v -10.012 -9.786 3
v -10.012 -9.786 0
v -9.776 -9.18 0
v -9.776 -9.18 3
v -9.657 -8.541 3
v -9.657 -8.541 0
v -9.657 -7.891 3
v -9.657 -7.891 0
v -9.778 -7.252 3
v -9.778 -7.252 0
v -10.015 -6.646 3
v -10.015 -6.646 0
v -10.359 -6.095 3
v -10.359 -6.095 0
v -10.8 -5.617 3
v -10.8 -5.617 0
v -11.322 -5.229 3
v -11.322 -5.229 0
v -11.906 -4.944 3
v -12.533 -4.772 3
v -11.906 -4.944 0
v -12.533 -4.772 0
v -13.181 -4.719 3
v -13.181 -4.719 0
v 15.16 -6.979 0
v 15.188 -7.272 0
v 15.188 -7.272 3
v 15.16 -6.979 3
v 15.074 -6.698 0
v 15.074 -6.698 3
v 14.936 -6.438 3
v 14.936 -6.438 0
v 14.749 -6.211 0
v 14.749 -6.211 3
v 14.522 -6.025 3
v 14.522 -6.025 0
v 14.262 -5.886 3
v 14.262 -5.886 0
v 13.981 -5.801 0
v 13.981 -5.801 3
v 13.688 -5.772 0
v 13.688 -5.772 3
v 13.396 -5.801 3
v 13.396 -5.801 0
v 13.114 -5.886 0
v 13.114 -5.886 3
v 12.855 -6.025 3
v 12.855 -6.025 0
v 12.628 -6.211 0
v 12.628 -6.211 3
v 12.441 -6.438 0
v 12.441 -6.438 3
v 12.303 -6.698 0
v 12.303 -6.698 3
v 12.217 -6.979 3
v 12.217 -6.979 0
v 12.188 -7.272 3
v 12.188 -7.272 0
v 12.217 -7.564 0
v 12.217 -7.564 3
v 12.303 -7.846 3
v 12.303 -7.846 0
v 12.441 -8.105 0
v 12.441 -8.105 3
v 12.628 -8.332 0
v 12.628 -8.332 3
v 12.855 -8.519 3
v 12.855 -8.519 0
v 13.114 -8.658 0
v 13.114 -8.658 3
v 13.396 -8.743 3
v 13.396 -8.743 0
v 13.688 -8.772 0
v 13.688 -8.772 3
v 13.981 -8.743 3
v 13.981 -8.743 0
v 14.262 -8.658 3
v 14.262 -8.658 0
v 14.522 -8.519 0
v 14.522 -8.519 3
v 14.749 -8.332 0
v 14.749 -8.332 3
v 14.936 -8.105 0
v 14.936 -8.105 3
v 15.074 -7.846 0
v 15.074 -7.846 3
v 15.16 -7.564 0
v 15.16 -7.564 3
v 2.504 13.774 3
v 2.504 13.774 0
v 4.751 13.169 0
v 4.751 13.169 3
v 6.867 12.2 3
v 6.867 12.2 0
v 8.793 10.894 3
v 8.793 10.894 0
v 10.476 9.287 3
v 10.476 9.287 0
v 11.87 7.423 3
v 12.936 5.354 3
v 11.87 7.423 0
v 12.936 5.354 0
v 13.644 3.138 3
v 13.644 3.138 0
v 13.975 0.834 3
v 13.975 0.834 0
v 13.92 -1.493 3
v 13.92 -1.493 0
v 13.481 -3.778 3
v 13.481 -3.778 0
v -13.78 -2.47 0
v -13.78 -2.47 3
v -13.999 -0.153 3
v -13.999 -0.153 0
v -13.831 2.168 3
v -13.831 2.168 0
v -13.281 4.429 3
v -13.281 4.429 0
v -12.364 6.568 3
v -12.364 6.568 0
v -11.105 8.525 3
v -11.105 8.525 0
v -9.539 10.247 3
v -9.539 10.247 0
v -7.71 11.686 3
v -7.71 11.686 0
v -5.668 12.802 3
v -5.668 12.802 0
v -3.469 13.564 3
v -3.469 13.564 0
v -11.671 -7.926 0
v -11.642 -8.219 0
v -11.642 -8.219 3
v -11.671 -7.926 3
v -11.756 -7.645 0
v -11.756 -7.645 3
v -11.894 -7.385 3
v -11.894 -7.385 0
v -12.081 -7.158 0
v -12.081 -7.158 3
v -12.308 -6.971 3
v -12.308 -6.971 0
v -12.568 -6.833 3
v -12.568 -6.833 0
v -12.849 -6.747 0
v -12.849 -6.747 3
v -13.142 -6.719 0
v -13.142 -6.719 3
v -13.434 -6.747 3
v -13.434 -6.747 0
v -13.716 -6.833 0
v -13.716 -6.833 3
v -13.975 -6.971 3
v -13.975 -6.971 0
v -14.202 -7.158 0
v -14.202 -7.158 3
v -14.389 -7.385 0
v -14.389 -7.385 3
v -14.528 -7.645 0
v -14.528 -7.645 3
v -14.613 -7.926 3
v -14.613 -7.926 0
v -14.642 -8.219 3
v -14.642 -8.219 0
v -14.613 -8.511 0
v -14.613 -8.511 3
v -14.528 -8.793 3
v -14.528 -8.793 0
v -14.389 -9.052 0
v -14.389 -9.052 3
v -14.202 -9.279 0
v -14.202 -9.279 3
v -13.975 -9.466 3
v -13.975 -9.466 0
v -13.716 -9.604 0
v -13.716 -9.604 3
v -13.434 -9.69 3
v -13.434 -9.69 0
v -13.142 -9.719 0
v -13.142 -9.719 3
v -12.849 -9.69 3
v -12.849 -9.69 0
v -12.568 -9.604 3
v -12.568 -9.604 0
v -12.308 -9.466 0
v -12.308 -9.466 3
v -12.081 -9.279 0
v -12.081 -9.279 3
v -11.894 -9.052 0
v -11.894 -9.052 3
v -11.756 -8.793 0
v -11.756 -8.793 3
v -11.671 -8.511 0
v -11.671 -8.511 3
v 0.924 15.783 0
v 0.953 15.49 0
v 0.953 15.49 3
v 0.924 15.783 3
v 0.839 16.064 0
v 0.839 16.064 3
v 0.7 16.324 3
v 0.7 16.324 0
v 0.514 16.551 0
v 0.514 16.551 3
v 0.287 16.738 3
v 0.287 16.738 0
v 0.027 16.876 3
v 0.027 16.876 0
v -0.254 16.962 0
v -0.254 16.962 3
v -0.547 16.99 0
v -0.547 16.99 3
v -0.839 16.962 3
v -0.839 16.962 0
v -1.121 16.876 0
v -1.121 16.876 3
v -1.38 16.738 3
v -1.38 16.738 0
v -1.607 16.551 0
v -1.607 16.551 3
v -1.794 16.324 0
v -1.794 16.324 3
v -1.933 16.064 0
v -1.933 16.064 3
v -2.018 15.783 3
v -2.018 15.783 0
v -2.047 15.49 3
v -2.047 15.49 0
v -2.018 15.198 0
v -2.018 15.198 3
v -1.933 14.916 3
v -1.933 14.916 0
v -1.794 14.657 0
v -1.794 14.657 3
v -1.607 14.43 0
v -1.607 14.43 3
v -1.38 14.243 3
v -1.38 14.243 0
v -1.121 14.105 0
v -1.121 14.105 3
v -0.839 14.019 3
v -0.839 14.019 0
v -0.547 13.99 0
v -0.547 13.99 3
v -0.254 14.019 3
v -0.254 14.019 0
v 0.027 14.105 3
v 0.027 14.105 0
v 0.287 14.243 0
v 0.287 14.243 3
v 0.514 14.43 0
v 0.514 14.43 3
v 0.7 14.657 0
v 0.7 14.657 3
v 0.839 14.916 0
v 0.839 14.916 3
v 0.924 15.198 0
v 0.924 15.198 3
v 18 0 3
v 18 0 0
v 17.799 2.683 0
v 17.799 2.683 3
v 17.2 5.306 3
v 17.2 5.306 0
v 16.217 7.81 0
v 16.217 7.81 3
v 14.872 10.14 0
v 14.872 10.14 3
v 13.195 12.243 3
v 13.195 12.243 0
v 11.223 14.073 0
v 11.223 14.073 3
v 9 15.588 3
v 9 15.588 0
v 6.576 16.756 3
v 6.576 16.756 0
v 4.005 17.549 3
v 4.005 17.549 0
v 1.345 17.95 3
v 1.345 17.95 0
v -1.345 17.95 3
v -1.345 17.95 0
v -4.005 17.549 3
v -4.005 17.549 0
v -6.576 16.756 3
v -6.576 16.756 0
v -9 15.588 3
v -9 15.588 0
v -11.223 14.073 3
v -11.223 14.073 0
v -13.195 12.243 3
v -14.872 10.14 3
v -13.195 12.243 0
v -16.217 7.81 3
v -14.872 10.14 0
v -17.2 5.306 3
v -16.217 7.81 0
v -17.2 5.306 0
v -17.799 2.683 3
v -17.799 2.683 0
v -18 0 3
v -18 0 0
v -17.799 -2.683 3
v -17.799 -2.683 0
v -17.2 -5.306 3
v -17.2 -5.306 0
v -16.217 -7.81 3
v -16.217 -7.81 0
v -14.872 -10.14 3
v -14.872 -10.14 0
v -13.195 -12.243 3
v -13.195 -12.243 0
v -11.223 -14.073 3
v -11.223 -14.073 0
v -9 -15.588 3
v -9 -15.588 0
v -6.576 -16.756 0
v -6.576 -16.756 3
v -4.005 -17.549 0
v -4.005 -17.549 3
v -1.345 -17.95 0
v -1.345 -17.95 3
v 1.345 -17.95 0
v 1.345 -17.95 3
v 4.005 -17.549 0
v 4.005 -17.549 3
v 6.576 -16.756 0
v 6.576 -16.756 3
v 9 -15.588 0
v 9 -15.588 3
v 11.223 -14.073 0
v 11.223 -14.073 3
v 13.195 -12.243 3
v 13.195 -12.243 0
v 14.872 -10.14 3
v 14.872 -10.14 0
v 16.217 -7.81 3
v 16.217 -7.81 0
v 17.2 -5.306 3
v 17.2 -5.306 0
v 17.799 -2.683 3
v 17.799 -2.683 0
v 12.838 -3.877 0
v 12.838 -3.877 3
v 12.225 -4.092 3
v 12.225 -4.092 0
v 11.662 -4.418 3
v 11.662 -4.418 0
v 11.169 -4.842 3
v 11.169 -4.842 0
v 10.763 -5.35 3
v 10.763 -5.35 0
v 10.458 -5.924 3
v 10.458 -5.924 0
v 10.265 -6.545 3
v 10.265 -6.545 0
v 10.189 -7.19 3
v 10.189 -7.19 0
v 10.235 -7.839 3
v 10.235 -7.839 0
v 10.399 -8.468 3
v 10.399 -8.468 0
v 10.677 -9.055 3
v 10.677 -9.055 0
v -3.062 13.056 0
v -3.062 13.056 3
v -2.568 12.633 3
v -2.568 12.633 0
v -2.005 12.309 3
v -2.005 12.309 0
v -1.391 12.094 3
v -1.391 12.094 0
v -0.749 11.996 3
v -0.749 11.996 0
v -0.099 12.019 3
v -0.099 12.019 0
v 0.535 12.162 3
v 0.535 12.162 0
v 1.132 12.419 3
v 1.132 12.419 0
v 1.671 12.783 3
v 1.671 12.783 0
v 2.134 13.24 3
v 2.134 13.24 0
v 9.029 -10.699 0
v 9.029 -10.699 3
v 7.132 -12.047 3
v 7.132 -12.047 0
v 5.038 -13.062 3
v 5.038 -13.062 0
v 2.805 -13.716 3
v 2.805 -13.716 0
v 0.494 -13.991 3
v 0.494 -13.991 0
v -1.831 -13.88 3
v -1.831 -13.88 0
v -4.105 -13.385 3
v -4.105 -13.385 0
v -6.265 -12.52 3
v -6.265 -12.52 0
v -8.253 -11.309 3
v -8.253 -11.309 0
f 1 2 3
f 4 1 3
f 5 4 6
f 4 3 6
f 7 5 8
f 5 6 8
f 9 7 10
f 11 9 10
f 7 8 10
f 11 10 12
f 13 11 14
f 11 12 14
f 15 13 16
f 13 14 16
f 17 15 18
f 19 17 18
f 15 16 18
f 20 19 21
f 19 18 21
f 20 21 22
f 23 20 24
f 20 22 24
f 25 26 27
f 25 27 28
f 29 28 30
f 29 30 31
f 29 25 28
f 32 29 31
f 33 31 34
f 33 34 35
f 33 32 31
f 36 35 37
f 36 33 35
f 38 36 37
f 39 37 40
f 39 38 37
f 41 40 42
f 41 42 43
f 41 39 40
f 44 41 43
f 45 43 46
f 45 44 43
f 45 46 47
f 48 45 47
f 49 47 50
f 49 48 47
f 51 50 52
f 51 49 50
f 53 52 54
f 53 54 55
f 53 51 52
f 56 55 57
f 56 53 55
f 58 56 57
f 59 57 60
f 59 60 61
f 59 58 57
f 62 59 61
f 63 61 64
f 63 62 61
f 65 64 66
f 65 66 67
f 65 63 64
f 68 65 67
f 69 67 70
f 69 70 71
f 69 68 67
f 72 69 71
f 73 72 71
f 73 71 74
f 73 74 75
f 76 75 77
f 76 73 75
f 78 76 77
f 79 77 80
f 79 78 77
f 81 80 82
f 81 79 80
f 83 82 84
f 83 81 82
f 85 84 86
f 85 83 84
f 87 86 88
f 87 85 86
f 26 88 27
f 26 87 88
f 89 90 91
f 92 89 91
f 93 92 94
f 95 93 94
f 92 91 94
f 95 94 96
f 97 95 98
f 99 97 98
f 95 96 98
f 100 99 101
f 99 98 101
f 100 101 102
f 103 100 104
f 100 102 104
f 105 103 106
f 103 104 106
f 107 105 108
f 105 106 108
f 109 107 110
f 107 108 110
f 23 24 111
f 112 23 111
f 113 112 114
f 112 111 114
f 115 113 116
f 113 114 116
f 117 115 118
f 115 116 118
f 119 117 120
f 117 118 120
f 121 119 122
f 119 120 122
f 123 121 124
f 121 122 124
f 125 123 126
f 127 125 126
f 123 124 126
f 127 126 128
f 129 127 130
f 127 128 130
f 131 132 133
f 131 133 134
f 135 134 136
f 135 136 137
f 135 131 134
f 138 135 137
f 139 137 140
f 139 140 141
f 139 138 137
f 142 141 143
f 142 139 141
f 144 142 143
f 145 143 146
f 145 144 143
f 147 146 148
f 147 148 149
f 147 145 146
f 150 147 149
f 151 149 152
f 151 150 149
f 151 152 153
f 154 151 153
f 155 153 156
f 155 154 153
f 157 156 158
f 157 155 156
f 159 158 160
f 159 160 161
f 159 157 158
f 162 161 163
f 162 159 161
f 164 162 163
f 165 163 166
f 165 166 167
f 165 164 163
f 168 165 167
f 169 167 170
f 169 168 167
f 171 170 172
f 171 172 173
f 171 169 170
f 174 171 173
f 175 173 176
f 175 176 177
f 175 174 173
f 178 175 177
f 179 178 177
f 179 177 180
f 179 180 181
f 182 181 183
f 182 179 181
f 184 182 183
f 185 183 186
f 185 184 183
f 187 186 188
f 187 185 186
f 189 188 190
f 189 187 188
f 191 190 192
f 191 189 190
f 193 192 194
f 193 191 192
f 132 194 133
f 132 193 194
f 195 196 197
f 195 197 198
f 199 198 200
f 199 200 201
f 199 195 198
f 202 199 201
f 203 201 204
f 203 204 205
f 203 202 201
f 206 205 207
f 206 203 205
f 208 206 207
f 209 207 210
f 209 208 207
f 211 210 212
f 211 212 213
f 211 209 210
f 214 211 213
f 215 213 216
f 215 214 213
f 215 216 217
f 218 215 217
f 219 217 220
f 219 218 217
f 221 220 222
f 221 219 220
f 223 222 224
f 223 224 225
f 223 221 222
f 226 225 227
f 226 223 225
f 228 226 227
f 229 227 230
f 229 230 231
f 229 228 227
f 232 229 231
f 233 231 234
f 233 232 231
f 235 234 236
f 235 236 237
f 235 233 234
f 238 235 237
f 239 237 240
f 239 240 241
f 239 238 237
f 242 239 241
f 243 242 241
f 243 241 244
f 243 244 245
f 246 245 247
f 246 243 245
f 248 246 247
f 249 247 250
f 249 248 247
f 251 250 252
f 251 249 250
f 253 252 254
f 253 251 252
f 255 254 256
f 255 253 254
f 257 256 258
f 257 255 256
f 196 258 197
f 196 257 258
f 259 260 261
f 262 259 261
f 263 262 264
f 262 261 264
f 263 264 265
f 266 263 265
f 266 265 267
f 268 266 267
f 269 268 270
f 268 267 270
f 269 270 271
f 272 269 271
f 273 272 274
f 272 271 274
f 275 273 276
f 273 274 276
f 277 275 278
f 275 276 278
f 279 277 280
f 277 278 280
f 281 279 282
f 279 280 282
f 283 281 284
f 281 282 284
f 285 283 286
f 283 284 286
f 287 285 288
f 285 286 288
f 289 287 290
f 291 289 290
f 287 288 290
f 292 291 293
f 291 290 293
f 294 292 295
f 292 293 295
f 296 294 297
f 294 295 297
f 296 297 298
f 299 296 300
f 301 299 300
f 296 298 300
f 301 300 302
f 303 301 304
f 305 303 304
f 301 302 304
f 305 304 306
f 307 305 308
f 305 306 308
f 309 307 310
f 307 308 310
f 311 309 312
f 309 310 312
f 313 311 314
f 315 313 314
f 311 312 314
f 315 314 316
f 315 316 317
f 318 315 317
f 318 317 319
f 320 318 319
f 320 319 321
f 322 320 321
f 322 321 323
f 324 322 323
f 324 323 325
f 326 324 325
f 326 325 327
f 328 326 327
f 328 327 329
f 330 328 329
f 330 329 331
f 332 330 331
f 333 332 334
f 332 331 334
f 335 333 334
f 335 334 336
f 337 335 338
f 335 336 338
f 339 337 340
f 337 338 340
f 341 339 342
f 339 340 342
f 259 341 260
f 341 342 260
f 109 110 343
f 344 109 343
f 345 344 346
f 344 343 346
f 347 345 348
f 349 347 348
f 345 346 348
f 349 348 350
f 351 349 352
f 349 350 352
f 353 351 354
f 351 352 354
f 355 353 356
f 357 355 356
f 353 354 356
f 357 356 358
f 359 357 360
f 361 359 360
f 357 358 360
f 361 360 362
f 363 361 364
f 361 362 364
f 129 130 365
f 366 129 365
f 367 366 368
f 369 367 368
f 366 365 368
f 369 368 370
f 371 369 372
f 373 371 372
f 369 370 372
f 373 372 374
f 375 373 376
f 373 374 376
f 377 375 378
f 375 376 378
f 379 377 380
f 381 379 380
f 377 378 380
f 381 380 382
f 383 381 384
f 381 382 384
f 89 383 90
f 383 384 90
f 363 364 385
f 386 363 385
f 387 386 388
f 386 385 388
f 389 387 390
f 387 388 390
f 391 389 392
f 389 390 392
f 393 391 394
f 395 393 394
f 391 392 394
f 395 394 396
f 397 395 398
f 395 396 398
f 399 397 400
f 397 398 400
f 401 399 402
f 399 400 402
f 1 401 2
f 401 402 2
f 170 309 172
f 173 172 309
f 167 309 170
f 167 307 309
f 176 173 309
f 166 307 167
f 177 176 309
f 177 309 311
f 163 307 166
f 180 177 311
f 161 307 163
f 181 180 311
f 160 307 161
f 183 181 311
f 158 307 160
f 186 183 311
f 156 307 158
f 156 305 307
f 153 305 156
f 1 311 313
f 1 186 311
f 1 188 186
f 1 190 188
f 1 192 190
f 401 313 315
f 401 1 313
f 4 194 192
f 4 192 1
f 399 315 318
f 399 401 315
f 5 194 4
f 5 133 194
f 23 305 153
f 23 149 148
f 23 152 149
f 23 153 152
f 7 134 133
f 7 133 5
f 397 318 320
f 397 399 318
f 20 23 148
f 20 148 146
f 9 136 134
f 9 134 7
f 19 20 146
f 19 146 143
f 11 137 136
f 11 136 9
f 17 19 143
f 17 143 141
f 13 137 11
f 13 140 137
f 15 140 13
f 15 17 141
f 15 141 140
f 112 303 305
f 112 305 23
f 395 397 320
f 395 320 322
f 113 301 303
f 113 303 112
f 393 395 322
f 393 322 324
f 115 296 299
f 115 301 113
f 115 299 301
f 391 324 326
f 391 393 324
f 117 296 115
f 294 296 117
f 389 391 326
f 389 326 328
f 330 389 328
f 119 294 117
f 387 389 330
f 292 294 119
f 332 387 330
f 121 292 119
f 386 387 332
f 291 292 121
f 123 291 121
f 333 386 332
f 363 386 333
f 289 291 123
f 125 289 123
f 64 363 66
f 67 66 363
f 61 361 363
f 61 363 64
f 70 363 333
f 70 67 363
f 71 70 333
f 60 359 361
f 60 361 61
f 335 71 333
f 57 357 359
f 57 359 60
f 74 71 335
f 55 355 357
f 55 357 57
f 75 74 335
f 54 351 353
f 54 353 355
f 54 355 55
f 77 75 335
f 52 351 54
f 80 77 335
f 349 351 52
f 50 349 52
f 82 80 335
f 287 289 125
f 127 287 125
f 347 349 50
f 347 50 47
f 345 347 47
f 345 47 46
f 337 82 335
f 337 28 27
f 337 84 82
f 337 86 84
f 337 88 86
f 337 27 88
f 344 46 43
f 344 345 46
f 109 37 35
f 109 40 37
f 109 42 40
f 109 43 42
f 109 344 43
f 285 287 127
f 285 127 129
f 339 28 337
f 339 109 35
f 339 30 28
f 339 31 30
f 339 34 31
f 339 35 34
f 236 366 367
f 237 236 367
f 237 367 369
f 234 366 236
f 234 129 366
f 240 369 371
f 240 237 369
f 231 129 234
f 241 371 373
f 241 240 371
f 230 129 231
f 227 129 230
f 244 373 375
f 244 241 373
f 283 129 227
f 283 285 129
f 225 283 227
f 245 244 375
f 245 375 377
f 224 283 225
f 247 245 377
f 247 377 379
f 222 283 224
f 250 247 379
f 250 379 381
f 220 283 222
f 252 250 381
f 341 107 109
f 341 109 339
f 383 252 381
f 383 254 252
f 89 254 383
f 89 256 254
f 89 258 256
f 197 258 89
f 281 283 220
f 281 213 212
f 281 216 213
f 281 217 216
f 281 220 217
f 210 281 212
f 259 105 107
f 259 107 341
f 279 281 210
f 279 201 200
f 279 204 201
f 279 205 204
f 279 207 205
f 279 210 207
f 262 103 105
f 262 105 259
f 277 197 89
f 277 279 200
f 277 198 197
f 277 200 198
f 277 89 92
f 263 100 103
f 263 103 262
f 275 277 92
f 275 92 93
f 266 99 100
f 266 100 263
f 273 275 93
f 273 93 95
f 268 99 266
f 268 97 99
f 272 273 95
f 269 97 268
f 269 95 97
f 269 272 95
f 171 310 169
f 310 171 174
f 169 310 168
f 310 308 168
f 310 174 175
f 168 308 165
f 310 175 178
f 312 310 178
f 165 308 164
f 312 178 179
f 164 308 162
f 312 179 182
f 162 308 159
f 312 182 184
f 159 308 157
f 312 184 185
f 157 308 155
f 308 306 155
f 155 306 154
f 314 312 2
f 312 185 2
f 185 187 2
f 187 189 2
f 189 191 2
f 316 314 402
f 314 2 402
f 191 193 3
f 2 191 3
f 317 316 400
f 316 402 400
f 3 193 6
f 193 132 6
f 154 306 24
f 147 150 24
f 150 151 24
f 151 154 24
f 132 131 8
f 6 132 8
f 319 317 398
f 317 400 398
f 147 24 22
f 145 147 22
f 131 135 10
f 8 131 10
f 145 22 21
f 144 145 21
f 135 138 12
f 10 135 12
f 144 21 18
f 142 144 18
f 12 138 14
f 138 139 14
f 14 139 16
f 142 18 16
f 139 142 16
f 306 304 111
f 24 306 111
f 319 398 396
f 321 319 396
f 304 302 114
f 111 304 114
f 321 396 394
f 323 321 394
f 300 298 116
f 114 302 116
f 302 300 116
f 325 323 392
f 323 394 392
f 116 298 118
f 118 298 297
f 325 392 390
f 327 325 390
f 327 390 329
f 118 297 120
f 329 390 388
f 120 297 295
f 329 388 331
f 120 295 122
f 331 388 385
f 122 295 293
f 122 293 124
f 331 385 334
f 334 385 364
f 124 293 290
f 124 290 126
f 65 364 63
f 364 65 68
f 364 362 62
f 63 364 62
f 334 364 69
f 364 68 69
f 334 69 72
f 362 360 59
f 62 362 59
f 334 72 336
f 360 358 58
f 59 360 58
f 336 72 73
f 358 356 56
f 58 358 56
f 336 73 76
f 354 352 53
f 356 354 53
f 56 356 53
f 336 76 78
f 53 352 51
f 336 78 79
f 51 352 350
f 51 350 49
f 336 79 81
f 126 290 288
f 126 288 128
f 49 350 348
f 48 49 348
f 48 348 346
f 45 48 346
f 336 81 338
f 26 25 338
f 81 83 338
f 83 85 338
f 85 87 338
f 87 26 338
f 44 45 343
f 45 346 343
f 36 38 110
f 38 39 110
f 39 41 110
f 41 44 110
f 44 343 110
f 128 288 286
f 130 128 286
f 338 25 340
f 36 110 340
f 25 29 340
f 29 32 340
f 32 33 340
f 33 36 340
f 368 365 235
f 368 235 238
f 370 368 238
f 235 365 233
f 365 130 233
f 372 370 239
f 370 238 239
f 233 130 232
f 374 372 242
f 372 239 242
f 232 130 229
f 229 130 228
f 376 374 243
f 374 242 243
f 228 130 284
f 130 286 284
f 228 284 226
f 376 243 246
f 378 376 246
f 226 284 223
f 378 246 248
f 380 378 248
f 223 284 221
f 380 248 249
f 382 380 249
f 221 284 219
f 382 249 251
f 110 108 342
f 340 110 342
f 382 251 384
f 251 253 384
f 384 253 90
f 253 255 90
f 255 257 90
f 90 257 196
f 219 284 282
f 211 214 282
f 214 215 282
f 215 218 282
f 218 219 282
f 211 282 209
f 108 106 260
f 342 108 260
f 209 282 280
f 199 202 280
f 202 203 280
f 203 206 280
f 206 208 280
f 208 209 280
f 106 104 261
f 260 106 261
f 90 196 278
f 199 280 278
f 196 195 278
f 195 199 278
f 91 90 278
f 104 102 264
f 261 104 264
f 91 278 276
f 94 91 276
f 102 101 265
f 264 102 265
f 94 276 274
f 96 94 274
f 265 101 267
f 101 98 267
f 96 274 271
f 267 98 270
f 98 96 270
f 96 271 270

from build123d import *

# Parameters (mm, degrees)
ESQUISSE1_R        = 18
ESQUISSE1_R_2      = 1.5
BOSS_EXTRU_2_DEPTH = 3


with BuildPart() as part:
    # Esquisse1 → Boss.-Extru.2 (new body)
    with BuildSketch(Plane.XY):
        Circle(ESQUISSE1_R)
        with Locations((-0.546712729, 15.490355231)):
            Circle(ESQUISSE1_R_2, mode=Mode.SUBTRACT)
        with Locations((-13.14168478, -8.218644727)):
            Circle(ESQUISSE1_R_2, mode=Mode.SUBTRACT)
        with Locations((13.688397508, -7.271710504)):
            Circle(ESQUISSE1_R_2, mode=Mode.SUBTRACT)
        with BuildLine():
            ThreePointArc((-3.468577117, 13.56351624), (-0.423261467, 11.992533082), (2.503723019, 13.774301109))
            ThreePointArc((2.503723019, 13.774301109), (11.869908833, 7.423292012), (13.480638187, -3.777882222))
            ThreePointArc((13.480638187, -3.777882222), (10.597469039, -5.629711358), (10.677033171, -9.055438293))
            ThreePointArc((10.677033171, -9.055438293), (0.493805045, -13.991288596), (-10.01206107, -9.785634018))
            ThreePointArc((-10.01206107, -9.785634018), (-10.174207571, -6.362821724), (-13.180756189, -4.718862816))
            ThreePointArc((-13.180756189, -4.718862816), (-12.363713879, 6.567996584), (-3.468577117, 13.56351624))
        make_face(mode=Mode.SUBTRACT)
    extrude(amount=BOSS_EXTRU_2_DEPTH)


solid = part.part
